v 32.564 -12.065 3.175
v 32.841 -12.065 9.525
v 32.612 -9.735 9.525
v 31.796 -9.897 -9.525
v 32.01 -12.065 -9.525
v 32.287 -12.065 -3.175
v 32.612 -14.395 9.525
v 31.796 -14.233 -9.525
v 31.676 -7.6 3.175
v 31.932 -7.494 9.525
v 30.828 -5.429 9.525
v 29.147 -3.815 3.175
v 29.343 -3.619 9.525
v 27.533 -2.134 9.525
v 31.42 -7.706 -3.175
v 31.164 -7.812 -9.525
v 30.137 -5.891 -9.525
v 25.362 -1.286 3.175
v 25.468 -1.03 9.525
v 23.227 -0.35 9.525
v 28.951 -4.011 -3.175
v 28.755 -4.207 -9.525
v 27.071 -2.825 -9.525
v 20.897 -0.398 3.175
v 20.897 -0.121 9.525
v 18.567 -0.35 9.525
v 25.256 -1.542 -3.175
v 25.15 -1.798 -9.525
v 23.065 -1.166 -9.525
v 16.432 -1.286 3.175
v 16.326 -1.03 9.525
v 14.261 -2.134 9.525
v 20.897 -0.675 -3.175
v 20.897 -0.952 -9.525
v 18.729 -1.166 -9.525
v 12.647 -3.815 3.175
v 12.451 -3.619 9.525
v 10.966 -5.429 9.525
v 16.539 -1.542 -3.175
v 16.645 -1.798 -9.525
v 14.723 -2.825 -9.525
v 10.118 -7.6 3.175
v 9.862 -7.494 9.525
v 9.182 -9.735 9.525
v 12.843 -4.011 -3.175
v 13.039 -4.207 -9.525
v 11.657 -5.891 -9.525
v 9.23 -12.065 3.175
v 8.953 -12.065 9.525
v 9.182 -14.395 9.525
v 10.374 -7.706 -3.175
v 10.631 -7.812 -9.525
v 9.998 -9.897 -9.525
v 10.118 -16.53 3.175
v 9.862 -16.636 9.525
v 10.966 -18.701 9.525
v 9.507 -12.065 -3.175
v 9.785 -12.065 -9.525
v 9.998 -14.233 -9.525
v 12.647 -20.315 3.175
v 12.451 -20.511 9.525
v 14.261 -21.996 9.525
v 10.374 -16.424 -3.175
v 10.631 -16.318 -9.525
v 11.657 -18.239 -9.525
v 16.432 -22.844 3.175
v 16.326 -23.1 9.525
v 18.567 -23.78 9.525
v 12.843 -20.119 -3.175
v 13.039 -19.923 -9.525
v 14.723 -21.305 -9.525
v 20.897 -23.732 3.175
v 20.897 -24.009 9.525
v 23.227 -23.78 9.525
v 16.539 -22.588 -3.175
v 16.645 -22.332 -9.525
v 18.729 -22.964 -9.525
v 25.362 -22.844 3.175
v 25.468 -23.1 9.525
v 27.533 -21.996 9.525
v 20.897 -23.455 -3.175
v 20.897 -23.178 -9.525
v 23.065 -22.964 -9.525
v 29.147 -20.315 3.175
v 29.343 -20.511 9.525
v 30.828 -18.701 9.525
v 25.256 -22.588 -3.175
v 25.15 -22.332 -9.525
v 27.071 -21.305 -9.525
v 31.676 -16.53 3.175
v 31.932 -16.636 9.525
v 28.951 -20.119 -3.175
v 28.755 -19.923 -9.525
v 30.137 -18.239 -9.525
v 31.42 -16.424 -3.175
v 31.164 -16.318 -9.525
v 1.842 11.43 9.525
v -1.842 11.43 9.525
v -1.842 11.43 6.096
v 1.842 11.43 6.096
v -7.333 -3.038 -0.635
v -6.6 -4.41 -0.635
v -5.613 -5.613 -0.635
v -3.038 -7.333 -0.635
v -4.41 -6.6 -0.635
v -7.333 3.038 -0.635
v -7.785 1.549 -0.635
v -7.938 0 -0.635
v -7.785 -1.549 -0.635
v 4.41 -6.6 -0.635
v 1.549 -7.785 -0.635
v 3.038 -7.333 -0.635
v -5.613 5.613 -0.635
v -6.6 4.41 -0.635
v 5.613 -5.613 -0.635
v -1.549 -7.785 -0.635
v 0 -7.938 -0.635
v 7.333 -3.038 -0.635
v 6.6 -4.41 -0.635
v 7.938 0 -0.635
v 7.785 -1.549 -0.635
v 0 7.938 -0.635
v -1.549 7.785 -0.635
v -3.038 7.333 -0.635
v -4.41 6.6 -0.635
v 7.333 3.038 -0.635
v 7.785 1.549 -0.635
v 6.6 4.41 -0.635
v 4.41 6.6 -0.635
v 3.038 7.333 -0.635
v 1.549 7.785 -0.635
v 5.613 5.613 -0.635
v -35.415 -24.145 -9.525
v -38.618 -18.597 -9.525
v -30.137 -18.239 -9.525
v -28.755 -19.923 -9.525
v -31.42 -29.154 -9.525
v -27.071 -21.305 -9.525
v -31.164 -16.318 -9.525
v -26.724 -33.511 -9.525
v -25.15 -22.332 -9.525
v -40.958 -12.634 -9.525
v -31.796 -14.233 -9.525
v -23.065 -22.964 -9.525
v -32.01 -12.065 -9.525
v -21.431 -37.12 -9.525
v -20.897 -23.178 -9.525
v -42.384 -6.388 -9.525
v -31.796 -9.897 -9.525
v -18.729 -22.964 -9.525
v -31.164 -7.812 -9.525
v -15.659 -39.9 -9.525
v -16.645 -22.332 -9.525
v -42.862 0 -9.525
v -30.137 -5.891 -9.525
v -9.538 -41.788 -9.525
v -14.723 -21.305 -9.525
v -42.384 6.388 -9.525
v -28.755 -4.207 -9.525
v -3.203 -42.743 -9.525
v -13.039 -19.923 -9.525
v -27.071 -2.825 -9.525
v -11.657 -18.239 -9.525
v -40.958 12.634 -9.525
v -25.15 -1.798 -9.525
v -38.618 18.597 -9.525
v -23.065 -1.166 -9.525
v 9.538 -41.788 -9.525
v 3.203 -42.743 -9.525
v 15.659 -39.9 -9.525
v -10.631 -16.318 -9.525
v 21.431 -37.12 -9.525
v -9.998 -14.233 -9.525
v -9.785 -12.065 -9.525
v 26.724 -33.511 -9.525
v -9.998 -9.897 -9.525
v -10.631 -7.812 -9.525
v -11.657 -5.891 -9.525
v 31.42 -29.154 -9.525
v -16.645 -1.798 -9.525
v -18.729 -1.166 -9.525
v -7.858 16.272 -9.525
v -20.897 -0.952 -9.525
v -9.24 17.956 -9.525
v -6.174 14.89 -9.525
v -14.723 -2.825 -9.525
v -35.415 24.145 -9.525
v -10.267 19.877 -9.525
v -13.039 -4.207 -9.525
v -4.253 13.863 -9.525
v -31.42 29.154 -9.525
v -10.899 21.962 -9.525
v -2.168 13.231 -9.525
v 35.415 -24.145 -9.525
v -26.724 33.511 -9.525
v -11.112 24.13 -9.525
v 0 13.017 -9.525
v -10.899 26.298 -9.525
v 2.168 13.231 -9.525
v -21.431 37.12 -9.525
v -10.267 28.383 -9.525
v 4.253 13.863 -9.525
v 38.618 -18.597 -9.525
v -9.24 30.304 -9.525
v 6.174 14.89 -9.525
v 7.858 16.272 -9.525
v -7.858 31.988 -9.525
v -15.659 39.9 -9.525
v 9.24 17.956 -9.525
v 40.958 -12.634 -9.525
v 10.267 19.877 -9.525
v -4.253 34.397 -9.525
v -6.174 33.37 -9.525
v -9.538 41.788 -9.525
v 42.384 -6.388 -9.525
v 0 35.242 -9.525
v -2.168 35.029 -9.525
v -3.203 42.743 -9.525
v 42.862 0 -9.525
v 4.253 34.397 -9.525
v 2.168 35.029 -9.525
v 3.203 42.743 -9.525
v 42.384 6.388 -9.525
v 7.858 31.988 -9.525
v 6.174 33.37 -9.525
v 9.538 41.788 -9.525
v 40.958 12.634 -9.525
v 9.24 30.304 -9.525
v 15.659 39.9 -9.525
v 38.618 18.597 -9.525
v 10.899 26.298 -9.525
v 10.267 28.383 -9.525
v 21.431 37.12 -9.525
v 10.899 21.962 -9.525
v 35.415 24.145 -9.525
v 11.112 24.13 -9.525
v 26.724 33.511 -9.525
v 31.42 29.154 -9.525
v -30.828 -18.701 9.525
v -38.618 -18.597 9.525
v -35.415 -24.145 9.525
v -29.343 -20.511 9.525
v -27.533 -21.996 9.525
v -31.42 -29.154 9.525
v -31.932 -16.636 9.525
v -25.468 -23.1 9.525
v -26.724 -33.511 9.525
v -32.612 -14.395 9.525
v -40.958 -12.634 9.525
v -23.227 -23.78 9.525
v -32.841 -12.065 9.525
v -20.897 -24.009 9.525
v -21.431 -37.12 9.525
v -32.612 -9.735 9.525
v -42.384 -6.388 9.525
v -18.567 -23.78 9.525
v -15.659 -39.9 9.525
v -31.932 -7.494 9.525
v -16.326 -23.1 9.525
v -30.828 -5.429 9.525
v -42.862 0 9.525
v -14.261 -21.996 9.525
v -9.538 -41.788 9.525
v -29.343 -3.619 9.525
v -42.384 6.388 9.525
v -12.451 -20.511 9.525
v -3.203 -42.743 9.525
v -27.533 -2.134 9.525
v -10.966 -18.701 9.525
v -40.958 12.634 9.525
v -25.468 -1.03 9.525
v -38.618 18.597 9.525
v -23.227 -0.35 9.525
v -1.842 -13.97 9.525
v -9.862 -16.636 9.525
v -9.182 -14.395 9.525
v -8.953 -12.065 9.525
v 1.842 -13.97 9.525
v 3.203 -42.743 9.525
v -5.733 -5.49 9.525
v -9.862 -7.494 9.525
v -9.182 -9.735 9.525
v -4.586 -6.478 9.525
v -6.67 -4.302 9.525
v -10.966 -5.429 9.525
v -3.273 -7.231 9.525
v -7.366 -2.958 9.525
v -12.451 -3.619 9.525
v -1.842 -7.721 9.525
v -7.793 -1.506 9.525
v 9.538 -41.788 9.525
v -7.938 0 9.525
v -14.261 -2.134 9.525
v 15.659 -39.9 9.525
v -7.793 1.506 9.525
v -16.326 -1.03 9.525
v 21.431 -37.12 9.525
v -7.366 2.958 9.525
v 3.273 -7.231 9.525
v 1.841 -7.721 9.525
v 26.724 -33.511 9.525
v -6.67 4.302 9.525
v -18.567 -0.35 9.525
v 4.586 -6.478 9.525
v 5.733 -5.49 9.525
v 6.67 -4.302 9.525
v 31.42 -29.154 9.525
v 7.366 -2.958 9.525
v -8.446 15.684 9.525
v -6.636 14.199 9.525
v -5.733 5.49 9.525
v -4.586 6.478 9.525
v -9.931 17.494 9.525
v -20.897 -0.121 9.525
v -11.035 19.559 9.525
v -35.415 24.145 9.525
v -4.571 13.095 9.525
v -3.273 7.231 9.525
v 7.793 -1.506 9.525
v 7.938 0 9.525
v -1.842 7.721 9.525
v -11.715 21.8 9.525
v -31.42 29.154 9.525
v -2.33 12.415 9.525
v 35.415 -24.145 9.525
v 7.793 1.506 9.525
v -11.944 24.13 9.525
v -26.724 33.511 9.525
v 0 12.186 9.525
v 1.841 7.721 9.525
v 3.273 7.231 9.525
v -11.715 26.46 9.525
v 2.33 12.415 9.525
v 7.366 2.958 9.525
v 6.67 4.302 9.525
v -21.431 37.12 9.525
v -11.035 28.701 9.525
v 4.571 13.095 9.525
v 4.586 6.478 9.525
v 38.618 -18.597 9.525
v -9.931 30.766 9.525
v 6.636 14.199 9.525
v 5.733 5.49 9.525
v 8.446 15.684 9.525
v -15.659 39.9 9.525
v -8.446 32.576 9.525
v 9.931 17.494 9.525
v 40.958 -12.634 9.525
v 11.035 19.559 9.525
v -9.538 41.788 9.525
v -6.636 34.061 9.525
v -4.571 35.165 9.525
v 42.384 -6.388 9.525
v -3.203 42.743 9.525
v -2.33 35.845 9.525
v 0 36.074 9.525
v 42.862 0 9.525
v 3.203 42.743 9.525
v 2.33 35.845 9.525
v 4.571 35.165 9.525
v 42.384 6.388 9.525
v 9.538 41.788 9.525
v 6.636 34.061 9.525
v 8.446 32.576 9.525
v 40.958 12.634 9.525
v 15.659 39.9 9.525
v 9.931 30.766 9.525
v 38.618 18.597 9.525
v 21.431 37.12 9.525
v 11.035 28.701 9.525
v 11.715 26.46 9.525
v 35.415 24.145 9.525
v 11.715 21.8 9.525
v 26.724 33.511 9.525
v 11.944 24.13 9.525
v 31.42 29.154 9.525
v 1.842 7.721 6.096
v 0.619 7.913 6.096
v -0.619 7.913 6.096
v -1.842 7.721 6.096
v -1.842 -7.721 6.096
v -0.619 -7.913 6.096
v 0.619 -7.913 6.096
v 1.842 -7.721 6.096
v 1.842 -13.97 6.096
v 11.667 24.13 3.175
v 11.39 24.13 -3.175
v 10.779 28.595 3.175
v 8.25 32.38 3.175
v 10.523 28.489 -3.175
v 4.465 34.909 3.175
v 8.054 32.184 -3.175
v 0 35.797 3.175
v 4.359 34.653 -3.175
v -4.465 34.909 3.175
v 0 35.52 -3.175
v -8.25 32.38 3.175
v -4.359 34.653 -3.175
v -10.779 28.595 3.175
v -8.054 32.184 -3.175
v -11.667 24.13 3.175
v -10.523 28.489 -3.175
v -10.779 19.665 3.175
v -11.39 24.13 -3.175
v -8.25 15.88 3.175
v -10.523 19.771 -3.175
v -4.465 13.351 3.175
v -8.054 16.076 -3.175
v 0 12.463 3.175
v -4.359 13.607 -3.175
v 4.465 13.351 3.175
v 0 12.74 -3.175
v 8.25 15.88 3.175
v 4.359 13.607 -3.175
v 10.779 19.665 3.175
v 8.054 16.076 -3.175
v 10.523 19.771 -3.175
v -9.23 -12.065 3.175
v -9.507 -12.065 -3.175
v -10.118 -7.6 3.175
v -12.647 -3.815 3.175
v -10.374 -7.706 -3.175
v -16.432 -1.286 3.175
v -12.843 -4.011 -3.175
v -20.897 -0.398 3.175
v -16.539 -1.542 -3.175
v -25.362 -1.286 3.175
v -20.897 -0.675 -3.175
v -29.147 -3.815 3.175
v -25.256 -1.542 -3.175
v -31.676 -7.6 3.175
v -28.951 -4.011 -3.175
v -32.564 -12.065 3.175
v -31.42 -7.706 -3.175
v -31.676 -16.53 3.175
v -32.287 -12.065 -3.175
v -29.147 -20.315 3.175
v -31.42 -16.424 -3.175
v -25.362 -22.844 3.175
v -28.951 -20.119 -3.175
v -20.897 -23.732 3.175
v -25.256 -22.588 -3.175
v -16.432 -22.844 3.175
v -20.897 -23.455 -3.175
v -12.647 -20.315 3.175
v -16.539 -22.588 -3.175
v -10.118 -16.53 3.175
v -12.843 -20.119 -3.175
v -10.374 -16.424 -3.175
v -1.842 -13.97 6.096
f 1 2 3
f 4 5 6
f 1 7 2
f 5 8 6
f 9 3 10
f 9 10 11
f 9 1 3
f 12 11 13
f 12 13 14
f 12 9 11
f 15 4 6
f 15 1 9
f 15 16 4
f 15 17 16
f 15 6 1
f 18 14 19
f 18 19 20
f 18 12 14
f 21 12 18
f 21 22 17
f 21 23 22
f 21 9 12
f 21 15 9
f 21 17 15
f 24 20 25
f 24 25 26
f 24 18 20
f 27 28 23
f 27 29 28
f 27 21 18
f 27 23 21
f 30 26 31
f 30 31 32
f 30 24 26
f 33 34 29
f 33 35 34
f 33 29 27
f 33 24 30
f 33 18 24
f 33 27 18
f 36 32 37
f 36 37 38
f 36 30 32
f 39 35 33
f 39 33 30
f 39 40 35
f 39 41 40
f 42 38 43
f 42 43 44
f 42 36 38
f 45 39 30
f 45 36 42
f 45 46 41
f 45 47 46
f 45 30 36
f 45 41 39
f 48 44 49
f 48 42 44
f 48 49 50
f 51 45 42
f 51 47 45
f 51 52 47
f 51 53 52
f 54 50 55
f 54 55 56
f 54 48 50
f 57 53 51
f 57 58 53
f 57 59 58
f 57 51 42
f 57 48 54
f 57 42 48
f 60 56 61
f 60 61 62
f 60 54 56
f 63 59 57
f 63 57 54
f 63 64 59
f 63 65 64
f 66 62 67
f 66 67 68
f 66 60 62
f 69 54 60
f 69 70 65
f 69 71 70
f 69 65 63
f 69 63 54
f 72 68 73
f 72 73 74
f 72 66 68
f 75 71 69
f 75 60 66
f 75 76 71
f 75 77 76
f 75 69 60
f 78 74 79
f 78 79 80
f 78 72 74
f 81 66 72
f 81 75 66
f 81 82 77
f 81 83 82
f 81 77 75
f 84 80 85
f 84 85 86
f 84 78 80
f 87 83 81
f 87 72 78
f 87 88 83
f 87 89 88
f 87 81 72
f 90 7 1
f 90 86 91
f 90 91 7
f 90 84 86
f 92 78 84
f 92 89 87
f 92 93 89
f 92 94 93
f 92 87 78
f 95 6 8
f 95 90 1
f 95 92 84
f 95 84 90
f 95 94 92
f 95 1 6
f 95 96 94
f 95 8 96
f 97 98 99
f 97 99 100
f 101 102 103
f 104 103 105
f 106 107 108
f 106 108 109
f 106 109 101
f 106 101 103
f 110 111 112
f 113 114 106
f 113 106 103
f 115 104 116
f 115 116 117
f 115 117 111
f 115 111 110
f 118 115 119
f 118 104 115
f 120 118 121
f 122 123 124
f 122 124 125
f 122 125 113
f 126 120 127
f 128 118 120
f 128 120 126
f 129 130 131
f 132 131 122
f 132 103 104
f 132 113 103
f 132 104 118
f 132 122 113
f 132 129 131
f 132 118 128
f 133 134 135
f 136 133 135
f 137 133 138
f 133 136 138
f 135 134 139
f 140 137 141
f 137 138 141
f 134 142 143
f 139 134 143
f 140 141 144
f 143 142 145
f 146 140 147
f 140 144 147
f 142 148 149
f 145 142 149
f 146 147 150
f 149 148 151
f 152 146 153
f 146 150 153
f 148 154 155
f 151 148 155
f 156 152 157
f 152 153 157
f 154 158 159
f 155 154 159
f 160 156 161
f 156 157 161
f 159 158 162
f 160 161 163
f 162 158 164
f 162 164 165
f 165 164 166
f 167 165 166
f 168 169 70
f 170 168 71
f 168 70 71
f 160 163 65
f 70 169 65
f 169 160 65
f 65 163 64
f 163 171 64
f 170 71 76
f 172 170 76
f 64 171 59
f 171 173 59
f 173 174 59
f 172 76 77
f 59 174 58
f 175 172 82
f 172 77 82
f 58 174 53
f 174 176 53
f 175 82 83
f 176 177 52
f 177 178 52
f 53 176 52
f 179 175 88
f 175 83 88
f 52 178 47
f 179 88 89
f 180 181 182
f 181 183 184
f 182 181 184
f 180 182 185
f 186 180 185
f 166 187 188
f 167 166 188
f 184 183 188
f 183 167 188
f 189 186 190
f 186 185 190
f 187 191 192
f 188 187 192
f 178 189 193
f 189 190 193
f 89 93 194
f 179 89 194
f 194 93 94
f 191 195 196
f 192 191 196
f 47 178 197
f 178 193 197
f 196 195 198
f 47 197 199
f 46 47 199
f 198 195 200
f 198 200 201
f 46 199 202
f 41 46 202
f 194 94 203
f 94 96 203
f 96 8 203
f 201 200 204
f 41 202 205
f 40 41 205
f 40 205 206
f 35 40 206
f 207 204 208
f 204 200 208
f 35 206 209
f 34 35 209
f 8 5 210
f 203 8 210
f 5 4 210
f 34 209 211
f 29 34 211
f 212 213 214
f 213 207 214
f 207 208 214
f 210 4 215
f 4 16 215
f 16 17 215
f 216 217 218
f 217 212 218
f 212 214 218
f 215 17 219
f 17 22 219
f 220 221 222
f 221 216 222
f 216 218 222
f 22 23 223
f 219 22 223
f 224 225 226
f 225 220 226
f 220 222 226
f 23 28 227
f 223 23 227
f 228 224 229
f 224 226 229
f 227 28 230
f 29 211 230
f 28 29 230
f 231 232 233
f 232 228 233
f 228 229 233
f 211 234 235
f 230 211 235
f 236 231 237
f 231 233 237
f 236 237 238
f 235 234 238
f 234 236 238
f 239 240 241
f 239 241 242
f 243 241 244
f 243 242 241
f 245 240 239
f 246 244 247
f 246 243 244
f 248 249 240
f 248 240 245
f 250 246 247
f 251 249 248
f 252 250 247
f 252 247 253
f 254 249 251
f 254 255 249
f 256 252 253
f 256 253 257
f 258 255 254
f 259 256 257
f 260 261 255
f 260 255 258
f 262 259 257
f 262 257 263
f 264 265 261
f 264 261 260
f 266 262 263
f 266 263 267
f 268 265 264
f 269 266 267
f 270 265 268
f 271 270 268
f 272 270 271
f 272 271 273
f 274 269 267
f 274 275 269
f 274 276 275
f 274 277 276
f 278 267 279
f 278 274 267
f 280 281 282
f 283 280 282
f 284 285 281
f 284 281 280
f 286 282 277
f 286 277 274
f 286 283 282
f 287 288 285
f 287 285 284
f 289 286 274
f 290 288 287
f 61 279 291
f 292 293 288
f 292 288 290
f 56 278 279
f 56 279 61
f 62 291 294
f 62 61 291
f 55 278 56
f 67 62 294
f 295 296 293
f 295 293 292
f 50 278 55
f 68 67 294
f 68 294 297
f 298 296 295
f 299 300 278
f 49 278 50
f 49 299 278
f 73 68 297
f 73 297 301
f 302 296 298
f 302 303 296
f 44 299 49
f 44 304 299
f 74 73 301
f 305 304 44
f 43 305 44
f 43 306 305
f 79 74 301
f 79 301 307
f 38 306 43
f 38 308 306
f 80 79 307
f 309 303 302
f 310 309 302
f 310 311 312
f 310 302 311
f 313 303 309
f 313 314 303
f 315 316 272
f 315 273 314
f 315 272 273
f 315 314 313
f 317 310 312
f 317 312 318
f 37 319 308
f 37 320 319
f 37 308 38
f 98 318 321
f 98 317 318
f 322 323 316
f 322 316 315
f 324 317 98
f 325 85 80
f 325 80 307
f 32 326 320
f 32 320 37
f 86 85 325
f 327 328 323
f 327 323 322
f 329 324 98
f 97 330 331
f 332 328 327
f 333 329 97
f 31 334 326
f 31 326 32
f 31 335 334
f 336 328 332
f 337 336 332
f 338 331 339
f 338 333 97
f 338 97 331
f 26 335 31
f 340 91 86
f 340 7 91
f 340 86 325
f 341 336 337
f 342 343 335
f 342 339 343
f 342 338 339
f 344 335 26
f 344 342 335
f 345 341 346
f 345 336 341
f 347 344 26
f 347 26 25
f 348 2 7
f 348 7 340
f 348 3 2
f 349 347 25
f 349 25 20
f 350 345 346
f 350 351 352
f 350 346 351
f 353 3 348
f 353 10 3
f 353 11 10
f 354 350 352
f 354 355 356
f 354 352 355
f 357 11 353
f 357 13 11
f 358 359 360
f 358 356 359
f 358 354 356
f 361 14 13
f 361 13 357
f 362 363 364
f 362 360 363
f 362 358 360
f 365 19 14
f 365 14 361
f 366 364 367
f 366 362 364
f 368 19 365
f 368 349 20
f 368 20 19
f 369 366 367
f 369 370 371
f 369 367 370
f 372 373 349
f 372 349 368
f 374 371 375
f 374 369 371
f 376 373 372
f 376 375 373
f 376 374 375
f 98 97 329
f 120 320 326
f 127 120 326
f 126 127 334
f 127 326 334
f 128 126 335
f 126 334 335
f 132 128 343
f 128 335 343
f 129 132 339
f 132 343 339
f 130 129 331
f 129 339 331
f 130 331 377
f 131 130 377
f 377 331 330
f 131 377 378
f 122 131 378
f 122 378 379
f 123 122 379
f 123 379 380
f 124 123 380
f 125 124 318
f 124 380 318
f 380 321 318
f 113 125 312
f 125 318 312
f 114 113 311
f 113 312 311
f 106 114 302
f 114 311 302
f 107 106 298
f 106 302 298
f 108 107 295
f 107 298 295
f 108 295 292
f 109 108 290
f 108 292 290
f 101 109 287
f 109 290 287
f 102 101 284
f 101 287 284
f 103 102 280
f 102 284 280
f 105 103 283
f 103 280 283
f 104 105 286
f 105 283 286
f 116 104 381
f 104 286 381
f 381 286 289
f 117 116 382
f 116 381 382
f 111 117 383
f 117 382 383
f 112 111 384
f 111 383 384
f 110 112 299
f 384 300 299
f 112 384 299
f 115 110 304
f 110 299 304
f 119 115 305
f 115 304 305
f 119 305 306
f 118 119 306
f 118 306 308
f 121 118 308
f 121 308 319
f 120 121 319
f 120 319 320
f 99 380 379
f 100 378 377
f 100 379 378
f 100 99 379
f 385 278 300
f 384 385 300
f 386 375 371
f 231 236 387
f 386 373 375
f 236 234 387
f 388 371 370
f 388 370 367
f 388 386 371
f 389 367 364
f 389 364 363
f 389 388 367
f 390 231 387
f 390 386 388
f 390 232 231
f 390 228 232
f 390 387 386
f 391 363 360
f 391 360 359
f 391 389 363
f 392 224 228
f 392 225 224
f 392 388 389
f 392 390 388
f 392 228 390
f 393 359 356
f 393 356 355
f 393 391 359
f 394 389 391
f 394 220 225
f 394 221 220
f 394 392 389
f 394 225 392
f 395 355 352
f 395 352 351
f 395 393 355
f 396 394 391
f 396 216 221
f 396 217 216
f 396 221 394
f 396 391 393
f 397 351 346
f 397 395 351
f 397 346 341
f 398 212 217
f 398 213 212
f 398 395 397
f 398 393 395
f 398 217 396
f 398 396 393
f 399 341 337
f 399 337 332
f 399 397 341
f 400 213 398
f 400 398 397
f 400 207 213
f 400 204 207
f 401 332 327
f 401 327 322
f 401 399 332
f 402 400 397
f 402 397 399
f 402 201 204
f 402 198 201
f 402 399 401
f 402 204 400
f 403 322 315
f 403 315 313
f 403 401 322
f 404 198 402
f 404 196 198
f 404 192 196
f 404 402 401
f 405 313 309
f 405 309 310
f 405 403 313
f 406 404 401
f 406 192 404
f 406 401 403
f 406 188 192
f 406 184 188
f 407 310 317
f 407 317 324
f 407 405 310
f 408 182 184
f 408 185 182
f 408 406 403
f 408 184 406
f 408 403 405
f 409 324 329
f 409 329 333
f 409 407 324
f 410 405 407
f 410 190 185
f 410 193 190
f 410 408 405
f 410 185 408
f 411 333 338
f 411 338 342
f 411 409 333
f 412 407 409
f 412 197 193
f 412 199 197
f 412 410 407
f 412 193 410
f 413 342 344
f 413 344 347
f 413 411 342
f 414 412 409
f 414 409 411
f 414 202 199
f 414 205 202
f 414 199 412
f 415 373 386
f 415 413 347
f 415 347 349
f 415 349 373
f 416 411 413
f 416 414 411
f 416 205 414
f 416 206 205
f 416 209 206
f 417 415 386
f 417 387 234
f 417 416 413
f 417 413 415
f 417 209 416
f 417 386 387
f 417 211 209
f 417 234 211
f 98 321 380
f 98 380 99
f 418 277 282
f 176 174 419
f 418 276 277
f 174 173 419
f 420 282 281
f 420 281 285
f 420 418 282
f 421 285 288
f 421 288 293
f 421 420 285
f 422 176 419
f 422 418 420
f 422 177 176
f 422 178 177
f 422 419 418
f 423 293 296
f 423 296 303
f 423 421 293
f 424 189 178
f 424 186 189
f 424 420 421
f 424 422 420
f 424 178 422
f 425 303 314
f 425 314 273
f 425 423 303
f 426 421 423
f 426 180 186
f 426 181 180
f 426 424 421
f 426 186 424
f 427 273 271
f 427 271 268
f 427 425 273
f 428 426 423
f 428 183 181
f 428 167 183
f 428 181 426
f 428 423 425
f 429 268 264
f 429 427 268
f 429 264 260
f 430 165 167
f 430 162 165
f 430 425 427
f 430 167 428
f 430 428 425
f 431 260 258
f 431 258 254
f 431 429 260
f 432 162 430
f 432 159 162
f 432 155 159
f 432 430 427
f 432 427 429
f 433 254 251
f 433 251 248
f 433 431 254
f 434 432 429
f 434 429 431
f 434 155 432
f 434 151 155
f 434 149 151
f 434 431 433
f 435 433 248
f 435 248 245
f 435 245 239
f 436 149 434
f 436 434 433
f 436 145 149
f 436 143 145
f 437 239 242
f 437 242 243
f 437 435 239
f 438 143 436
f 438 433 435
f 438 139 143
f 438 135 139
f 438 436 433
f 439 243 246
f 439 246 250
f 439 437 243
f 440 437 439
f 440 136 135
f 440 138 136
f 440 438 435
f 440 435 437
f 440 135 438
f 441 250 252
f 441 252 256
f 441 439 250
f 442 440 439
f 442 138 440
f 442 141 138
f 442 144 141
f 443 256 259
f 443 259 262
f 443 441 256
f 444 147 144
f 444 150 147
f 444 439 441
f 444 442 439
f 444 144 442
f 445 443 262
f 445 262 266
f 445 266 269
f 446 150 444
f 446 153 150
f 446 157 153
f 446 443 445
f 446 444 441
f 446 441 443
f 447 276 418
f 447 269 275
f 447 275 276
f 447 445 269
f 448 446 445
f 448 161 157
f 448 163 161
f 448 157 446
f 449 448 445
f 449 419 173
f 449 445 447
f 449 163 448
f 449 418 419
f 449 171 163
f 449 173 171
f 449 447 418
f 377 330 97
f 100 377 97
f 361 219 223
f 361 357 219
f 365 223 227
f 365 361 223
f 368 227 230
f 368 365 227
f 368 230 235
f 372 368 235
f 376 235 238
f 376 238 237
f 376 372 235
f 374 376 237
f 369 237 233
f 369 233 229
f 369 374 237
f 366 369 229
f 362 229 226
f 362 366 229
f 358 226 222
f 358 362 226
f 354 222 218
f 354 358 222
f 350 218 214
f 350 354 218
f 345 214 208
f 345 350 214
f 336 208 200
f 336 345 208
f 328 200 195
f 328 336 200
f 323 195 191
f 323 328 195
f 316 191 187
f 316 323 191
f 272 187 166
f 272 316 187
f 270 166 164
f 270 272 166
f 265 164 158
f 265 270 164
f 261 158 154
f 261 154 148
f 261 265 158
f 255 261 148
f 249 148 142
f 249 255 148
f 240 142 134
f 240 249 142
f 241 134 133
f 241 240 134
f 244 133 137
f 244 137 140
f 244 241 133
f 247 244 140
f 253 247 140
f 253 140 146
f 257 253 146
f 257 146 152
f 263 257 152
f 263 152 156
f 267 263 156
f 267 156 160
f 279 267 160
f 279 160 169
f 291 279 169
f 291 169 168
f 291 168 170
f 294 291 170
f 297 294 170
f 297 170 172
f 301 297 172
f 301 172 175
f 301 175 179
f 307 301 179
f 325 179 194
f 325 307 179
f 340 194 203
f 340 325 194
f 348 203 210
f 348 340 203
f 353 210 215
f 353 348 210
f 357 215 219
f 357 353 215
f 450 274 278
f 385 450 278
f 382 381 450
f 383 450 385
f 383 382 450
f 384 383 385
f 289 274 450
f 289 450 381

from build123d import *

# Parameters (mm, degrees)
SKETCH1_R           = 42.8625
SKETCH1_R_2         = 11.1125
BOSS_EXTRUDE1_DEPTH = 9.525
SKETCH2_R           = 7.9375
CUT_EXTRUDE1_DEPTH  = 10.16
SKETCH3_W           = 3.683
SKETCH3_H           = 25.4
CUT_EXTRUDE2_DEPTH  = 3.429
DRAFT2_ANGLE        = -2.5


with BuildPart() as part:
    # Sketch1 → Boss-Extrude1 (new body, symmetric)
    with BuildSketch(Plane.XY):
        Circle(SKETCH1_R)
        with Locations((0, 24.13)):
            Circle(SKETCH1_R_2, mode=Mode.SUBTRACT)
        with Locations((-20.897192993, -12.065)):
            Circle(SKETCH1_R_2, mode=Mode.SUBTRACT)
        with Locations((20.897192993, -12.065)):
            Circle(SKETCH1_R_2, mode=Mode.SUBTRACT)
    extrude(amount=BOSS_EXTRUDE1_DEPTH, both=True)

    # Sketch2 → Cut-Extrude1 (cut)
    with BuildSketch(Plane.XY.offset(9.525)):
        Circle(SKETCH2_R)
    extrude(amount=-CUT_EXTRUDE1_DEPTH, mode=Mode.SUBTRACT)

    # Sketch3 → Cut-Extrude2 (cut)
    with BuildSketch(Plane.XY.offset(9.525)):
        with Locations((0, -1.27)):
            Rectangle(SKETCH3_W, SKETCH3_H)
    extrude(amount=-CUT_EXTRUDE2_DEPTH, mode=Mode.SUBTRACT)

    # Draft2
    draft2_faces = [part.faces().sort_by_distance(p)[0] for p in [
        (-32.009692993, -12.065, 0),
        (9.784692993, -12.065, 0),
        (-11.1125, 24.13, 0),
    ]]
    draft(draft2_faces, Plane(origin=(0, 0, -9.525), x_dir=(-1, 0, 0), z_dir=(0, 0, -1)), DRAFT2_ANGLE)


solid = part.part
